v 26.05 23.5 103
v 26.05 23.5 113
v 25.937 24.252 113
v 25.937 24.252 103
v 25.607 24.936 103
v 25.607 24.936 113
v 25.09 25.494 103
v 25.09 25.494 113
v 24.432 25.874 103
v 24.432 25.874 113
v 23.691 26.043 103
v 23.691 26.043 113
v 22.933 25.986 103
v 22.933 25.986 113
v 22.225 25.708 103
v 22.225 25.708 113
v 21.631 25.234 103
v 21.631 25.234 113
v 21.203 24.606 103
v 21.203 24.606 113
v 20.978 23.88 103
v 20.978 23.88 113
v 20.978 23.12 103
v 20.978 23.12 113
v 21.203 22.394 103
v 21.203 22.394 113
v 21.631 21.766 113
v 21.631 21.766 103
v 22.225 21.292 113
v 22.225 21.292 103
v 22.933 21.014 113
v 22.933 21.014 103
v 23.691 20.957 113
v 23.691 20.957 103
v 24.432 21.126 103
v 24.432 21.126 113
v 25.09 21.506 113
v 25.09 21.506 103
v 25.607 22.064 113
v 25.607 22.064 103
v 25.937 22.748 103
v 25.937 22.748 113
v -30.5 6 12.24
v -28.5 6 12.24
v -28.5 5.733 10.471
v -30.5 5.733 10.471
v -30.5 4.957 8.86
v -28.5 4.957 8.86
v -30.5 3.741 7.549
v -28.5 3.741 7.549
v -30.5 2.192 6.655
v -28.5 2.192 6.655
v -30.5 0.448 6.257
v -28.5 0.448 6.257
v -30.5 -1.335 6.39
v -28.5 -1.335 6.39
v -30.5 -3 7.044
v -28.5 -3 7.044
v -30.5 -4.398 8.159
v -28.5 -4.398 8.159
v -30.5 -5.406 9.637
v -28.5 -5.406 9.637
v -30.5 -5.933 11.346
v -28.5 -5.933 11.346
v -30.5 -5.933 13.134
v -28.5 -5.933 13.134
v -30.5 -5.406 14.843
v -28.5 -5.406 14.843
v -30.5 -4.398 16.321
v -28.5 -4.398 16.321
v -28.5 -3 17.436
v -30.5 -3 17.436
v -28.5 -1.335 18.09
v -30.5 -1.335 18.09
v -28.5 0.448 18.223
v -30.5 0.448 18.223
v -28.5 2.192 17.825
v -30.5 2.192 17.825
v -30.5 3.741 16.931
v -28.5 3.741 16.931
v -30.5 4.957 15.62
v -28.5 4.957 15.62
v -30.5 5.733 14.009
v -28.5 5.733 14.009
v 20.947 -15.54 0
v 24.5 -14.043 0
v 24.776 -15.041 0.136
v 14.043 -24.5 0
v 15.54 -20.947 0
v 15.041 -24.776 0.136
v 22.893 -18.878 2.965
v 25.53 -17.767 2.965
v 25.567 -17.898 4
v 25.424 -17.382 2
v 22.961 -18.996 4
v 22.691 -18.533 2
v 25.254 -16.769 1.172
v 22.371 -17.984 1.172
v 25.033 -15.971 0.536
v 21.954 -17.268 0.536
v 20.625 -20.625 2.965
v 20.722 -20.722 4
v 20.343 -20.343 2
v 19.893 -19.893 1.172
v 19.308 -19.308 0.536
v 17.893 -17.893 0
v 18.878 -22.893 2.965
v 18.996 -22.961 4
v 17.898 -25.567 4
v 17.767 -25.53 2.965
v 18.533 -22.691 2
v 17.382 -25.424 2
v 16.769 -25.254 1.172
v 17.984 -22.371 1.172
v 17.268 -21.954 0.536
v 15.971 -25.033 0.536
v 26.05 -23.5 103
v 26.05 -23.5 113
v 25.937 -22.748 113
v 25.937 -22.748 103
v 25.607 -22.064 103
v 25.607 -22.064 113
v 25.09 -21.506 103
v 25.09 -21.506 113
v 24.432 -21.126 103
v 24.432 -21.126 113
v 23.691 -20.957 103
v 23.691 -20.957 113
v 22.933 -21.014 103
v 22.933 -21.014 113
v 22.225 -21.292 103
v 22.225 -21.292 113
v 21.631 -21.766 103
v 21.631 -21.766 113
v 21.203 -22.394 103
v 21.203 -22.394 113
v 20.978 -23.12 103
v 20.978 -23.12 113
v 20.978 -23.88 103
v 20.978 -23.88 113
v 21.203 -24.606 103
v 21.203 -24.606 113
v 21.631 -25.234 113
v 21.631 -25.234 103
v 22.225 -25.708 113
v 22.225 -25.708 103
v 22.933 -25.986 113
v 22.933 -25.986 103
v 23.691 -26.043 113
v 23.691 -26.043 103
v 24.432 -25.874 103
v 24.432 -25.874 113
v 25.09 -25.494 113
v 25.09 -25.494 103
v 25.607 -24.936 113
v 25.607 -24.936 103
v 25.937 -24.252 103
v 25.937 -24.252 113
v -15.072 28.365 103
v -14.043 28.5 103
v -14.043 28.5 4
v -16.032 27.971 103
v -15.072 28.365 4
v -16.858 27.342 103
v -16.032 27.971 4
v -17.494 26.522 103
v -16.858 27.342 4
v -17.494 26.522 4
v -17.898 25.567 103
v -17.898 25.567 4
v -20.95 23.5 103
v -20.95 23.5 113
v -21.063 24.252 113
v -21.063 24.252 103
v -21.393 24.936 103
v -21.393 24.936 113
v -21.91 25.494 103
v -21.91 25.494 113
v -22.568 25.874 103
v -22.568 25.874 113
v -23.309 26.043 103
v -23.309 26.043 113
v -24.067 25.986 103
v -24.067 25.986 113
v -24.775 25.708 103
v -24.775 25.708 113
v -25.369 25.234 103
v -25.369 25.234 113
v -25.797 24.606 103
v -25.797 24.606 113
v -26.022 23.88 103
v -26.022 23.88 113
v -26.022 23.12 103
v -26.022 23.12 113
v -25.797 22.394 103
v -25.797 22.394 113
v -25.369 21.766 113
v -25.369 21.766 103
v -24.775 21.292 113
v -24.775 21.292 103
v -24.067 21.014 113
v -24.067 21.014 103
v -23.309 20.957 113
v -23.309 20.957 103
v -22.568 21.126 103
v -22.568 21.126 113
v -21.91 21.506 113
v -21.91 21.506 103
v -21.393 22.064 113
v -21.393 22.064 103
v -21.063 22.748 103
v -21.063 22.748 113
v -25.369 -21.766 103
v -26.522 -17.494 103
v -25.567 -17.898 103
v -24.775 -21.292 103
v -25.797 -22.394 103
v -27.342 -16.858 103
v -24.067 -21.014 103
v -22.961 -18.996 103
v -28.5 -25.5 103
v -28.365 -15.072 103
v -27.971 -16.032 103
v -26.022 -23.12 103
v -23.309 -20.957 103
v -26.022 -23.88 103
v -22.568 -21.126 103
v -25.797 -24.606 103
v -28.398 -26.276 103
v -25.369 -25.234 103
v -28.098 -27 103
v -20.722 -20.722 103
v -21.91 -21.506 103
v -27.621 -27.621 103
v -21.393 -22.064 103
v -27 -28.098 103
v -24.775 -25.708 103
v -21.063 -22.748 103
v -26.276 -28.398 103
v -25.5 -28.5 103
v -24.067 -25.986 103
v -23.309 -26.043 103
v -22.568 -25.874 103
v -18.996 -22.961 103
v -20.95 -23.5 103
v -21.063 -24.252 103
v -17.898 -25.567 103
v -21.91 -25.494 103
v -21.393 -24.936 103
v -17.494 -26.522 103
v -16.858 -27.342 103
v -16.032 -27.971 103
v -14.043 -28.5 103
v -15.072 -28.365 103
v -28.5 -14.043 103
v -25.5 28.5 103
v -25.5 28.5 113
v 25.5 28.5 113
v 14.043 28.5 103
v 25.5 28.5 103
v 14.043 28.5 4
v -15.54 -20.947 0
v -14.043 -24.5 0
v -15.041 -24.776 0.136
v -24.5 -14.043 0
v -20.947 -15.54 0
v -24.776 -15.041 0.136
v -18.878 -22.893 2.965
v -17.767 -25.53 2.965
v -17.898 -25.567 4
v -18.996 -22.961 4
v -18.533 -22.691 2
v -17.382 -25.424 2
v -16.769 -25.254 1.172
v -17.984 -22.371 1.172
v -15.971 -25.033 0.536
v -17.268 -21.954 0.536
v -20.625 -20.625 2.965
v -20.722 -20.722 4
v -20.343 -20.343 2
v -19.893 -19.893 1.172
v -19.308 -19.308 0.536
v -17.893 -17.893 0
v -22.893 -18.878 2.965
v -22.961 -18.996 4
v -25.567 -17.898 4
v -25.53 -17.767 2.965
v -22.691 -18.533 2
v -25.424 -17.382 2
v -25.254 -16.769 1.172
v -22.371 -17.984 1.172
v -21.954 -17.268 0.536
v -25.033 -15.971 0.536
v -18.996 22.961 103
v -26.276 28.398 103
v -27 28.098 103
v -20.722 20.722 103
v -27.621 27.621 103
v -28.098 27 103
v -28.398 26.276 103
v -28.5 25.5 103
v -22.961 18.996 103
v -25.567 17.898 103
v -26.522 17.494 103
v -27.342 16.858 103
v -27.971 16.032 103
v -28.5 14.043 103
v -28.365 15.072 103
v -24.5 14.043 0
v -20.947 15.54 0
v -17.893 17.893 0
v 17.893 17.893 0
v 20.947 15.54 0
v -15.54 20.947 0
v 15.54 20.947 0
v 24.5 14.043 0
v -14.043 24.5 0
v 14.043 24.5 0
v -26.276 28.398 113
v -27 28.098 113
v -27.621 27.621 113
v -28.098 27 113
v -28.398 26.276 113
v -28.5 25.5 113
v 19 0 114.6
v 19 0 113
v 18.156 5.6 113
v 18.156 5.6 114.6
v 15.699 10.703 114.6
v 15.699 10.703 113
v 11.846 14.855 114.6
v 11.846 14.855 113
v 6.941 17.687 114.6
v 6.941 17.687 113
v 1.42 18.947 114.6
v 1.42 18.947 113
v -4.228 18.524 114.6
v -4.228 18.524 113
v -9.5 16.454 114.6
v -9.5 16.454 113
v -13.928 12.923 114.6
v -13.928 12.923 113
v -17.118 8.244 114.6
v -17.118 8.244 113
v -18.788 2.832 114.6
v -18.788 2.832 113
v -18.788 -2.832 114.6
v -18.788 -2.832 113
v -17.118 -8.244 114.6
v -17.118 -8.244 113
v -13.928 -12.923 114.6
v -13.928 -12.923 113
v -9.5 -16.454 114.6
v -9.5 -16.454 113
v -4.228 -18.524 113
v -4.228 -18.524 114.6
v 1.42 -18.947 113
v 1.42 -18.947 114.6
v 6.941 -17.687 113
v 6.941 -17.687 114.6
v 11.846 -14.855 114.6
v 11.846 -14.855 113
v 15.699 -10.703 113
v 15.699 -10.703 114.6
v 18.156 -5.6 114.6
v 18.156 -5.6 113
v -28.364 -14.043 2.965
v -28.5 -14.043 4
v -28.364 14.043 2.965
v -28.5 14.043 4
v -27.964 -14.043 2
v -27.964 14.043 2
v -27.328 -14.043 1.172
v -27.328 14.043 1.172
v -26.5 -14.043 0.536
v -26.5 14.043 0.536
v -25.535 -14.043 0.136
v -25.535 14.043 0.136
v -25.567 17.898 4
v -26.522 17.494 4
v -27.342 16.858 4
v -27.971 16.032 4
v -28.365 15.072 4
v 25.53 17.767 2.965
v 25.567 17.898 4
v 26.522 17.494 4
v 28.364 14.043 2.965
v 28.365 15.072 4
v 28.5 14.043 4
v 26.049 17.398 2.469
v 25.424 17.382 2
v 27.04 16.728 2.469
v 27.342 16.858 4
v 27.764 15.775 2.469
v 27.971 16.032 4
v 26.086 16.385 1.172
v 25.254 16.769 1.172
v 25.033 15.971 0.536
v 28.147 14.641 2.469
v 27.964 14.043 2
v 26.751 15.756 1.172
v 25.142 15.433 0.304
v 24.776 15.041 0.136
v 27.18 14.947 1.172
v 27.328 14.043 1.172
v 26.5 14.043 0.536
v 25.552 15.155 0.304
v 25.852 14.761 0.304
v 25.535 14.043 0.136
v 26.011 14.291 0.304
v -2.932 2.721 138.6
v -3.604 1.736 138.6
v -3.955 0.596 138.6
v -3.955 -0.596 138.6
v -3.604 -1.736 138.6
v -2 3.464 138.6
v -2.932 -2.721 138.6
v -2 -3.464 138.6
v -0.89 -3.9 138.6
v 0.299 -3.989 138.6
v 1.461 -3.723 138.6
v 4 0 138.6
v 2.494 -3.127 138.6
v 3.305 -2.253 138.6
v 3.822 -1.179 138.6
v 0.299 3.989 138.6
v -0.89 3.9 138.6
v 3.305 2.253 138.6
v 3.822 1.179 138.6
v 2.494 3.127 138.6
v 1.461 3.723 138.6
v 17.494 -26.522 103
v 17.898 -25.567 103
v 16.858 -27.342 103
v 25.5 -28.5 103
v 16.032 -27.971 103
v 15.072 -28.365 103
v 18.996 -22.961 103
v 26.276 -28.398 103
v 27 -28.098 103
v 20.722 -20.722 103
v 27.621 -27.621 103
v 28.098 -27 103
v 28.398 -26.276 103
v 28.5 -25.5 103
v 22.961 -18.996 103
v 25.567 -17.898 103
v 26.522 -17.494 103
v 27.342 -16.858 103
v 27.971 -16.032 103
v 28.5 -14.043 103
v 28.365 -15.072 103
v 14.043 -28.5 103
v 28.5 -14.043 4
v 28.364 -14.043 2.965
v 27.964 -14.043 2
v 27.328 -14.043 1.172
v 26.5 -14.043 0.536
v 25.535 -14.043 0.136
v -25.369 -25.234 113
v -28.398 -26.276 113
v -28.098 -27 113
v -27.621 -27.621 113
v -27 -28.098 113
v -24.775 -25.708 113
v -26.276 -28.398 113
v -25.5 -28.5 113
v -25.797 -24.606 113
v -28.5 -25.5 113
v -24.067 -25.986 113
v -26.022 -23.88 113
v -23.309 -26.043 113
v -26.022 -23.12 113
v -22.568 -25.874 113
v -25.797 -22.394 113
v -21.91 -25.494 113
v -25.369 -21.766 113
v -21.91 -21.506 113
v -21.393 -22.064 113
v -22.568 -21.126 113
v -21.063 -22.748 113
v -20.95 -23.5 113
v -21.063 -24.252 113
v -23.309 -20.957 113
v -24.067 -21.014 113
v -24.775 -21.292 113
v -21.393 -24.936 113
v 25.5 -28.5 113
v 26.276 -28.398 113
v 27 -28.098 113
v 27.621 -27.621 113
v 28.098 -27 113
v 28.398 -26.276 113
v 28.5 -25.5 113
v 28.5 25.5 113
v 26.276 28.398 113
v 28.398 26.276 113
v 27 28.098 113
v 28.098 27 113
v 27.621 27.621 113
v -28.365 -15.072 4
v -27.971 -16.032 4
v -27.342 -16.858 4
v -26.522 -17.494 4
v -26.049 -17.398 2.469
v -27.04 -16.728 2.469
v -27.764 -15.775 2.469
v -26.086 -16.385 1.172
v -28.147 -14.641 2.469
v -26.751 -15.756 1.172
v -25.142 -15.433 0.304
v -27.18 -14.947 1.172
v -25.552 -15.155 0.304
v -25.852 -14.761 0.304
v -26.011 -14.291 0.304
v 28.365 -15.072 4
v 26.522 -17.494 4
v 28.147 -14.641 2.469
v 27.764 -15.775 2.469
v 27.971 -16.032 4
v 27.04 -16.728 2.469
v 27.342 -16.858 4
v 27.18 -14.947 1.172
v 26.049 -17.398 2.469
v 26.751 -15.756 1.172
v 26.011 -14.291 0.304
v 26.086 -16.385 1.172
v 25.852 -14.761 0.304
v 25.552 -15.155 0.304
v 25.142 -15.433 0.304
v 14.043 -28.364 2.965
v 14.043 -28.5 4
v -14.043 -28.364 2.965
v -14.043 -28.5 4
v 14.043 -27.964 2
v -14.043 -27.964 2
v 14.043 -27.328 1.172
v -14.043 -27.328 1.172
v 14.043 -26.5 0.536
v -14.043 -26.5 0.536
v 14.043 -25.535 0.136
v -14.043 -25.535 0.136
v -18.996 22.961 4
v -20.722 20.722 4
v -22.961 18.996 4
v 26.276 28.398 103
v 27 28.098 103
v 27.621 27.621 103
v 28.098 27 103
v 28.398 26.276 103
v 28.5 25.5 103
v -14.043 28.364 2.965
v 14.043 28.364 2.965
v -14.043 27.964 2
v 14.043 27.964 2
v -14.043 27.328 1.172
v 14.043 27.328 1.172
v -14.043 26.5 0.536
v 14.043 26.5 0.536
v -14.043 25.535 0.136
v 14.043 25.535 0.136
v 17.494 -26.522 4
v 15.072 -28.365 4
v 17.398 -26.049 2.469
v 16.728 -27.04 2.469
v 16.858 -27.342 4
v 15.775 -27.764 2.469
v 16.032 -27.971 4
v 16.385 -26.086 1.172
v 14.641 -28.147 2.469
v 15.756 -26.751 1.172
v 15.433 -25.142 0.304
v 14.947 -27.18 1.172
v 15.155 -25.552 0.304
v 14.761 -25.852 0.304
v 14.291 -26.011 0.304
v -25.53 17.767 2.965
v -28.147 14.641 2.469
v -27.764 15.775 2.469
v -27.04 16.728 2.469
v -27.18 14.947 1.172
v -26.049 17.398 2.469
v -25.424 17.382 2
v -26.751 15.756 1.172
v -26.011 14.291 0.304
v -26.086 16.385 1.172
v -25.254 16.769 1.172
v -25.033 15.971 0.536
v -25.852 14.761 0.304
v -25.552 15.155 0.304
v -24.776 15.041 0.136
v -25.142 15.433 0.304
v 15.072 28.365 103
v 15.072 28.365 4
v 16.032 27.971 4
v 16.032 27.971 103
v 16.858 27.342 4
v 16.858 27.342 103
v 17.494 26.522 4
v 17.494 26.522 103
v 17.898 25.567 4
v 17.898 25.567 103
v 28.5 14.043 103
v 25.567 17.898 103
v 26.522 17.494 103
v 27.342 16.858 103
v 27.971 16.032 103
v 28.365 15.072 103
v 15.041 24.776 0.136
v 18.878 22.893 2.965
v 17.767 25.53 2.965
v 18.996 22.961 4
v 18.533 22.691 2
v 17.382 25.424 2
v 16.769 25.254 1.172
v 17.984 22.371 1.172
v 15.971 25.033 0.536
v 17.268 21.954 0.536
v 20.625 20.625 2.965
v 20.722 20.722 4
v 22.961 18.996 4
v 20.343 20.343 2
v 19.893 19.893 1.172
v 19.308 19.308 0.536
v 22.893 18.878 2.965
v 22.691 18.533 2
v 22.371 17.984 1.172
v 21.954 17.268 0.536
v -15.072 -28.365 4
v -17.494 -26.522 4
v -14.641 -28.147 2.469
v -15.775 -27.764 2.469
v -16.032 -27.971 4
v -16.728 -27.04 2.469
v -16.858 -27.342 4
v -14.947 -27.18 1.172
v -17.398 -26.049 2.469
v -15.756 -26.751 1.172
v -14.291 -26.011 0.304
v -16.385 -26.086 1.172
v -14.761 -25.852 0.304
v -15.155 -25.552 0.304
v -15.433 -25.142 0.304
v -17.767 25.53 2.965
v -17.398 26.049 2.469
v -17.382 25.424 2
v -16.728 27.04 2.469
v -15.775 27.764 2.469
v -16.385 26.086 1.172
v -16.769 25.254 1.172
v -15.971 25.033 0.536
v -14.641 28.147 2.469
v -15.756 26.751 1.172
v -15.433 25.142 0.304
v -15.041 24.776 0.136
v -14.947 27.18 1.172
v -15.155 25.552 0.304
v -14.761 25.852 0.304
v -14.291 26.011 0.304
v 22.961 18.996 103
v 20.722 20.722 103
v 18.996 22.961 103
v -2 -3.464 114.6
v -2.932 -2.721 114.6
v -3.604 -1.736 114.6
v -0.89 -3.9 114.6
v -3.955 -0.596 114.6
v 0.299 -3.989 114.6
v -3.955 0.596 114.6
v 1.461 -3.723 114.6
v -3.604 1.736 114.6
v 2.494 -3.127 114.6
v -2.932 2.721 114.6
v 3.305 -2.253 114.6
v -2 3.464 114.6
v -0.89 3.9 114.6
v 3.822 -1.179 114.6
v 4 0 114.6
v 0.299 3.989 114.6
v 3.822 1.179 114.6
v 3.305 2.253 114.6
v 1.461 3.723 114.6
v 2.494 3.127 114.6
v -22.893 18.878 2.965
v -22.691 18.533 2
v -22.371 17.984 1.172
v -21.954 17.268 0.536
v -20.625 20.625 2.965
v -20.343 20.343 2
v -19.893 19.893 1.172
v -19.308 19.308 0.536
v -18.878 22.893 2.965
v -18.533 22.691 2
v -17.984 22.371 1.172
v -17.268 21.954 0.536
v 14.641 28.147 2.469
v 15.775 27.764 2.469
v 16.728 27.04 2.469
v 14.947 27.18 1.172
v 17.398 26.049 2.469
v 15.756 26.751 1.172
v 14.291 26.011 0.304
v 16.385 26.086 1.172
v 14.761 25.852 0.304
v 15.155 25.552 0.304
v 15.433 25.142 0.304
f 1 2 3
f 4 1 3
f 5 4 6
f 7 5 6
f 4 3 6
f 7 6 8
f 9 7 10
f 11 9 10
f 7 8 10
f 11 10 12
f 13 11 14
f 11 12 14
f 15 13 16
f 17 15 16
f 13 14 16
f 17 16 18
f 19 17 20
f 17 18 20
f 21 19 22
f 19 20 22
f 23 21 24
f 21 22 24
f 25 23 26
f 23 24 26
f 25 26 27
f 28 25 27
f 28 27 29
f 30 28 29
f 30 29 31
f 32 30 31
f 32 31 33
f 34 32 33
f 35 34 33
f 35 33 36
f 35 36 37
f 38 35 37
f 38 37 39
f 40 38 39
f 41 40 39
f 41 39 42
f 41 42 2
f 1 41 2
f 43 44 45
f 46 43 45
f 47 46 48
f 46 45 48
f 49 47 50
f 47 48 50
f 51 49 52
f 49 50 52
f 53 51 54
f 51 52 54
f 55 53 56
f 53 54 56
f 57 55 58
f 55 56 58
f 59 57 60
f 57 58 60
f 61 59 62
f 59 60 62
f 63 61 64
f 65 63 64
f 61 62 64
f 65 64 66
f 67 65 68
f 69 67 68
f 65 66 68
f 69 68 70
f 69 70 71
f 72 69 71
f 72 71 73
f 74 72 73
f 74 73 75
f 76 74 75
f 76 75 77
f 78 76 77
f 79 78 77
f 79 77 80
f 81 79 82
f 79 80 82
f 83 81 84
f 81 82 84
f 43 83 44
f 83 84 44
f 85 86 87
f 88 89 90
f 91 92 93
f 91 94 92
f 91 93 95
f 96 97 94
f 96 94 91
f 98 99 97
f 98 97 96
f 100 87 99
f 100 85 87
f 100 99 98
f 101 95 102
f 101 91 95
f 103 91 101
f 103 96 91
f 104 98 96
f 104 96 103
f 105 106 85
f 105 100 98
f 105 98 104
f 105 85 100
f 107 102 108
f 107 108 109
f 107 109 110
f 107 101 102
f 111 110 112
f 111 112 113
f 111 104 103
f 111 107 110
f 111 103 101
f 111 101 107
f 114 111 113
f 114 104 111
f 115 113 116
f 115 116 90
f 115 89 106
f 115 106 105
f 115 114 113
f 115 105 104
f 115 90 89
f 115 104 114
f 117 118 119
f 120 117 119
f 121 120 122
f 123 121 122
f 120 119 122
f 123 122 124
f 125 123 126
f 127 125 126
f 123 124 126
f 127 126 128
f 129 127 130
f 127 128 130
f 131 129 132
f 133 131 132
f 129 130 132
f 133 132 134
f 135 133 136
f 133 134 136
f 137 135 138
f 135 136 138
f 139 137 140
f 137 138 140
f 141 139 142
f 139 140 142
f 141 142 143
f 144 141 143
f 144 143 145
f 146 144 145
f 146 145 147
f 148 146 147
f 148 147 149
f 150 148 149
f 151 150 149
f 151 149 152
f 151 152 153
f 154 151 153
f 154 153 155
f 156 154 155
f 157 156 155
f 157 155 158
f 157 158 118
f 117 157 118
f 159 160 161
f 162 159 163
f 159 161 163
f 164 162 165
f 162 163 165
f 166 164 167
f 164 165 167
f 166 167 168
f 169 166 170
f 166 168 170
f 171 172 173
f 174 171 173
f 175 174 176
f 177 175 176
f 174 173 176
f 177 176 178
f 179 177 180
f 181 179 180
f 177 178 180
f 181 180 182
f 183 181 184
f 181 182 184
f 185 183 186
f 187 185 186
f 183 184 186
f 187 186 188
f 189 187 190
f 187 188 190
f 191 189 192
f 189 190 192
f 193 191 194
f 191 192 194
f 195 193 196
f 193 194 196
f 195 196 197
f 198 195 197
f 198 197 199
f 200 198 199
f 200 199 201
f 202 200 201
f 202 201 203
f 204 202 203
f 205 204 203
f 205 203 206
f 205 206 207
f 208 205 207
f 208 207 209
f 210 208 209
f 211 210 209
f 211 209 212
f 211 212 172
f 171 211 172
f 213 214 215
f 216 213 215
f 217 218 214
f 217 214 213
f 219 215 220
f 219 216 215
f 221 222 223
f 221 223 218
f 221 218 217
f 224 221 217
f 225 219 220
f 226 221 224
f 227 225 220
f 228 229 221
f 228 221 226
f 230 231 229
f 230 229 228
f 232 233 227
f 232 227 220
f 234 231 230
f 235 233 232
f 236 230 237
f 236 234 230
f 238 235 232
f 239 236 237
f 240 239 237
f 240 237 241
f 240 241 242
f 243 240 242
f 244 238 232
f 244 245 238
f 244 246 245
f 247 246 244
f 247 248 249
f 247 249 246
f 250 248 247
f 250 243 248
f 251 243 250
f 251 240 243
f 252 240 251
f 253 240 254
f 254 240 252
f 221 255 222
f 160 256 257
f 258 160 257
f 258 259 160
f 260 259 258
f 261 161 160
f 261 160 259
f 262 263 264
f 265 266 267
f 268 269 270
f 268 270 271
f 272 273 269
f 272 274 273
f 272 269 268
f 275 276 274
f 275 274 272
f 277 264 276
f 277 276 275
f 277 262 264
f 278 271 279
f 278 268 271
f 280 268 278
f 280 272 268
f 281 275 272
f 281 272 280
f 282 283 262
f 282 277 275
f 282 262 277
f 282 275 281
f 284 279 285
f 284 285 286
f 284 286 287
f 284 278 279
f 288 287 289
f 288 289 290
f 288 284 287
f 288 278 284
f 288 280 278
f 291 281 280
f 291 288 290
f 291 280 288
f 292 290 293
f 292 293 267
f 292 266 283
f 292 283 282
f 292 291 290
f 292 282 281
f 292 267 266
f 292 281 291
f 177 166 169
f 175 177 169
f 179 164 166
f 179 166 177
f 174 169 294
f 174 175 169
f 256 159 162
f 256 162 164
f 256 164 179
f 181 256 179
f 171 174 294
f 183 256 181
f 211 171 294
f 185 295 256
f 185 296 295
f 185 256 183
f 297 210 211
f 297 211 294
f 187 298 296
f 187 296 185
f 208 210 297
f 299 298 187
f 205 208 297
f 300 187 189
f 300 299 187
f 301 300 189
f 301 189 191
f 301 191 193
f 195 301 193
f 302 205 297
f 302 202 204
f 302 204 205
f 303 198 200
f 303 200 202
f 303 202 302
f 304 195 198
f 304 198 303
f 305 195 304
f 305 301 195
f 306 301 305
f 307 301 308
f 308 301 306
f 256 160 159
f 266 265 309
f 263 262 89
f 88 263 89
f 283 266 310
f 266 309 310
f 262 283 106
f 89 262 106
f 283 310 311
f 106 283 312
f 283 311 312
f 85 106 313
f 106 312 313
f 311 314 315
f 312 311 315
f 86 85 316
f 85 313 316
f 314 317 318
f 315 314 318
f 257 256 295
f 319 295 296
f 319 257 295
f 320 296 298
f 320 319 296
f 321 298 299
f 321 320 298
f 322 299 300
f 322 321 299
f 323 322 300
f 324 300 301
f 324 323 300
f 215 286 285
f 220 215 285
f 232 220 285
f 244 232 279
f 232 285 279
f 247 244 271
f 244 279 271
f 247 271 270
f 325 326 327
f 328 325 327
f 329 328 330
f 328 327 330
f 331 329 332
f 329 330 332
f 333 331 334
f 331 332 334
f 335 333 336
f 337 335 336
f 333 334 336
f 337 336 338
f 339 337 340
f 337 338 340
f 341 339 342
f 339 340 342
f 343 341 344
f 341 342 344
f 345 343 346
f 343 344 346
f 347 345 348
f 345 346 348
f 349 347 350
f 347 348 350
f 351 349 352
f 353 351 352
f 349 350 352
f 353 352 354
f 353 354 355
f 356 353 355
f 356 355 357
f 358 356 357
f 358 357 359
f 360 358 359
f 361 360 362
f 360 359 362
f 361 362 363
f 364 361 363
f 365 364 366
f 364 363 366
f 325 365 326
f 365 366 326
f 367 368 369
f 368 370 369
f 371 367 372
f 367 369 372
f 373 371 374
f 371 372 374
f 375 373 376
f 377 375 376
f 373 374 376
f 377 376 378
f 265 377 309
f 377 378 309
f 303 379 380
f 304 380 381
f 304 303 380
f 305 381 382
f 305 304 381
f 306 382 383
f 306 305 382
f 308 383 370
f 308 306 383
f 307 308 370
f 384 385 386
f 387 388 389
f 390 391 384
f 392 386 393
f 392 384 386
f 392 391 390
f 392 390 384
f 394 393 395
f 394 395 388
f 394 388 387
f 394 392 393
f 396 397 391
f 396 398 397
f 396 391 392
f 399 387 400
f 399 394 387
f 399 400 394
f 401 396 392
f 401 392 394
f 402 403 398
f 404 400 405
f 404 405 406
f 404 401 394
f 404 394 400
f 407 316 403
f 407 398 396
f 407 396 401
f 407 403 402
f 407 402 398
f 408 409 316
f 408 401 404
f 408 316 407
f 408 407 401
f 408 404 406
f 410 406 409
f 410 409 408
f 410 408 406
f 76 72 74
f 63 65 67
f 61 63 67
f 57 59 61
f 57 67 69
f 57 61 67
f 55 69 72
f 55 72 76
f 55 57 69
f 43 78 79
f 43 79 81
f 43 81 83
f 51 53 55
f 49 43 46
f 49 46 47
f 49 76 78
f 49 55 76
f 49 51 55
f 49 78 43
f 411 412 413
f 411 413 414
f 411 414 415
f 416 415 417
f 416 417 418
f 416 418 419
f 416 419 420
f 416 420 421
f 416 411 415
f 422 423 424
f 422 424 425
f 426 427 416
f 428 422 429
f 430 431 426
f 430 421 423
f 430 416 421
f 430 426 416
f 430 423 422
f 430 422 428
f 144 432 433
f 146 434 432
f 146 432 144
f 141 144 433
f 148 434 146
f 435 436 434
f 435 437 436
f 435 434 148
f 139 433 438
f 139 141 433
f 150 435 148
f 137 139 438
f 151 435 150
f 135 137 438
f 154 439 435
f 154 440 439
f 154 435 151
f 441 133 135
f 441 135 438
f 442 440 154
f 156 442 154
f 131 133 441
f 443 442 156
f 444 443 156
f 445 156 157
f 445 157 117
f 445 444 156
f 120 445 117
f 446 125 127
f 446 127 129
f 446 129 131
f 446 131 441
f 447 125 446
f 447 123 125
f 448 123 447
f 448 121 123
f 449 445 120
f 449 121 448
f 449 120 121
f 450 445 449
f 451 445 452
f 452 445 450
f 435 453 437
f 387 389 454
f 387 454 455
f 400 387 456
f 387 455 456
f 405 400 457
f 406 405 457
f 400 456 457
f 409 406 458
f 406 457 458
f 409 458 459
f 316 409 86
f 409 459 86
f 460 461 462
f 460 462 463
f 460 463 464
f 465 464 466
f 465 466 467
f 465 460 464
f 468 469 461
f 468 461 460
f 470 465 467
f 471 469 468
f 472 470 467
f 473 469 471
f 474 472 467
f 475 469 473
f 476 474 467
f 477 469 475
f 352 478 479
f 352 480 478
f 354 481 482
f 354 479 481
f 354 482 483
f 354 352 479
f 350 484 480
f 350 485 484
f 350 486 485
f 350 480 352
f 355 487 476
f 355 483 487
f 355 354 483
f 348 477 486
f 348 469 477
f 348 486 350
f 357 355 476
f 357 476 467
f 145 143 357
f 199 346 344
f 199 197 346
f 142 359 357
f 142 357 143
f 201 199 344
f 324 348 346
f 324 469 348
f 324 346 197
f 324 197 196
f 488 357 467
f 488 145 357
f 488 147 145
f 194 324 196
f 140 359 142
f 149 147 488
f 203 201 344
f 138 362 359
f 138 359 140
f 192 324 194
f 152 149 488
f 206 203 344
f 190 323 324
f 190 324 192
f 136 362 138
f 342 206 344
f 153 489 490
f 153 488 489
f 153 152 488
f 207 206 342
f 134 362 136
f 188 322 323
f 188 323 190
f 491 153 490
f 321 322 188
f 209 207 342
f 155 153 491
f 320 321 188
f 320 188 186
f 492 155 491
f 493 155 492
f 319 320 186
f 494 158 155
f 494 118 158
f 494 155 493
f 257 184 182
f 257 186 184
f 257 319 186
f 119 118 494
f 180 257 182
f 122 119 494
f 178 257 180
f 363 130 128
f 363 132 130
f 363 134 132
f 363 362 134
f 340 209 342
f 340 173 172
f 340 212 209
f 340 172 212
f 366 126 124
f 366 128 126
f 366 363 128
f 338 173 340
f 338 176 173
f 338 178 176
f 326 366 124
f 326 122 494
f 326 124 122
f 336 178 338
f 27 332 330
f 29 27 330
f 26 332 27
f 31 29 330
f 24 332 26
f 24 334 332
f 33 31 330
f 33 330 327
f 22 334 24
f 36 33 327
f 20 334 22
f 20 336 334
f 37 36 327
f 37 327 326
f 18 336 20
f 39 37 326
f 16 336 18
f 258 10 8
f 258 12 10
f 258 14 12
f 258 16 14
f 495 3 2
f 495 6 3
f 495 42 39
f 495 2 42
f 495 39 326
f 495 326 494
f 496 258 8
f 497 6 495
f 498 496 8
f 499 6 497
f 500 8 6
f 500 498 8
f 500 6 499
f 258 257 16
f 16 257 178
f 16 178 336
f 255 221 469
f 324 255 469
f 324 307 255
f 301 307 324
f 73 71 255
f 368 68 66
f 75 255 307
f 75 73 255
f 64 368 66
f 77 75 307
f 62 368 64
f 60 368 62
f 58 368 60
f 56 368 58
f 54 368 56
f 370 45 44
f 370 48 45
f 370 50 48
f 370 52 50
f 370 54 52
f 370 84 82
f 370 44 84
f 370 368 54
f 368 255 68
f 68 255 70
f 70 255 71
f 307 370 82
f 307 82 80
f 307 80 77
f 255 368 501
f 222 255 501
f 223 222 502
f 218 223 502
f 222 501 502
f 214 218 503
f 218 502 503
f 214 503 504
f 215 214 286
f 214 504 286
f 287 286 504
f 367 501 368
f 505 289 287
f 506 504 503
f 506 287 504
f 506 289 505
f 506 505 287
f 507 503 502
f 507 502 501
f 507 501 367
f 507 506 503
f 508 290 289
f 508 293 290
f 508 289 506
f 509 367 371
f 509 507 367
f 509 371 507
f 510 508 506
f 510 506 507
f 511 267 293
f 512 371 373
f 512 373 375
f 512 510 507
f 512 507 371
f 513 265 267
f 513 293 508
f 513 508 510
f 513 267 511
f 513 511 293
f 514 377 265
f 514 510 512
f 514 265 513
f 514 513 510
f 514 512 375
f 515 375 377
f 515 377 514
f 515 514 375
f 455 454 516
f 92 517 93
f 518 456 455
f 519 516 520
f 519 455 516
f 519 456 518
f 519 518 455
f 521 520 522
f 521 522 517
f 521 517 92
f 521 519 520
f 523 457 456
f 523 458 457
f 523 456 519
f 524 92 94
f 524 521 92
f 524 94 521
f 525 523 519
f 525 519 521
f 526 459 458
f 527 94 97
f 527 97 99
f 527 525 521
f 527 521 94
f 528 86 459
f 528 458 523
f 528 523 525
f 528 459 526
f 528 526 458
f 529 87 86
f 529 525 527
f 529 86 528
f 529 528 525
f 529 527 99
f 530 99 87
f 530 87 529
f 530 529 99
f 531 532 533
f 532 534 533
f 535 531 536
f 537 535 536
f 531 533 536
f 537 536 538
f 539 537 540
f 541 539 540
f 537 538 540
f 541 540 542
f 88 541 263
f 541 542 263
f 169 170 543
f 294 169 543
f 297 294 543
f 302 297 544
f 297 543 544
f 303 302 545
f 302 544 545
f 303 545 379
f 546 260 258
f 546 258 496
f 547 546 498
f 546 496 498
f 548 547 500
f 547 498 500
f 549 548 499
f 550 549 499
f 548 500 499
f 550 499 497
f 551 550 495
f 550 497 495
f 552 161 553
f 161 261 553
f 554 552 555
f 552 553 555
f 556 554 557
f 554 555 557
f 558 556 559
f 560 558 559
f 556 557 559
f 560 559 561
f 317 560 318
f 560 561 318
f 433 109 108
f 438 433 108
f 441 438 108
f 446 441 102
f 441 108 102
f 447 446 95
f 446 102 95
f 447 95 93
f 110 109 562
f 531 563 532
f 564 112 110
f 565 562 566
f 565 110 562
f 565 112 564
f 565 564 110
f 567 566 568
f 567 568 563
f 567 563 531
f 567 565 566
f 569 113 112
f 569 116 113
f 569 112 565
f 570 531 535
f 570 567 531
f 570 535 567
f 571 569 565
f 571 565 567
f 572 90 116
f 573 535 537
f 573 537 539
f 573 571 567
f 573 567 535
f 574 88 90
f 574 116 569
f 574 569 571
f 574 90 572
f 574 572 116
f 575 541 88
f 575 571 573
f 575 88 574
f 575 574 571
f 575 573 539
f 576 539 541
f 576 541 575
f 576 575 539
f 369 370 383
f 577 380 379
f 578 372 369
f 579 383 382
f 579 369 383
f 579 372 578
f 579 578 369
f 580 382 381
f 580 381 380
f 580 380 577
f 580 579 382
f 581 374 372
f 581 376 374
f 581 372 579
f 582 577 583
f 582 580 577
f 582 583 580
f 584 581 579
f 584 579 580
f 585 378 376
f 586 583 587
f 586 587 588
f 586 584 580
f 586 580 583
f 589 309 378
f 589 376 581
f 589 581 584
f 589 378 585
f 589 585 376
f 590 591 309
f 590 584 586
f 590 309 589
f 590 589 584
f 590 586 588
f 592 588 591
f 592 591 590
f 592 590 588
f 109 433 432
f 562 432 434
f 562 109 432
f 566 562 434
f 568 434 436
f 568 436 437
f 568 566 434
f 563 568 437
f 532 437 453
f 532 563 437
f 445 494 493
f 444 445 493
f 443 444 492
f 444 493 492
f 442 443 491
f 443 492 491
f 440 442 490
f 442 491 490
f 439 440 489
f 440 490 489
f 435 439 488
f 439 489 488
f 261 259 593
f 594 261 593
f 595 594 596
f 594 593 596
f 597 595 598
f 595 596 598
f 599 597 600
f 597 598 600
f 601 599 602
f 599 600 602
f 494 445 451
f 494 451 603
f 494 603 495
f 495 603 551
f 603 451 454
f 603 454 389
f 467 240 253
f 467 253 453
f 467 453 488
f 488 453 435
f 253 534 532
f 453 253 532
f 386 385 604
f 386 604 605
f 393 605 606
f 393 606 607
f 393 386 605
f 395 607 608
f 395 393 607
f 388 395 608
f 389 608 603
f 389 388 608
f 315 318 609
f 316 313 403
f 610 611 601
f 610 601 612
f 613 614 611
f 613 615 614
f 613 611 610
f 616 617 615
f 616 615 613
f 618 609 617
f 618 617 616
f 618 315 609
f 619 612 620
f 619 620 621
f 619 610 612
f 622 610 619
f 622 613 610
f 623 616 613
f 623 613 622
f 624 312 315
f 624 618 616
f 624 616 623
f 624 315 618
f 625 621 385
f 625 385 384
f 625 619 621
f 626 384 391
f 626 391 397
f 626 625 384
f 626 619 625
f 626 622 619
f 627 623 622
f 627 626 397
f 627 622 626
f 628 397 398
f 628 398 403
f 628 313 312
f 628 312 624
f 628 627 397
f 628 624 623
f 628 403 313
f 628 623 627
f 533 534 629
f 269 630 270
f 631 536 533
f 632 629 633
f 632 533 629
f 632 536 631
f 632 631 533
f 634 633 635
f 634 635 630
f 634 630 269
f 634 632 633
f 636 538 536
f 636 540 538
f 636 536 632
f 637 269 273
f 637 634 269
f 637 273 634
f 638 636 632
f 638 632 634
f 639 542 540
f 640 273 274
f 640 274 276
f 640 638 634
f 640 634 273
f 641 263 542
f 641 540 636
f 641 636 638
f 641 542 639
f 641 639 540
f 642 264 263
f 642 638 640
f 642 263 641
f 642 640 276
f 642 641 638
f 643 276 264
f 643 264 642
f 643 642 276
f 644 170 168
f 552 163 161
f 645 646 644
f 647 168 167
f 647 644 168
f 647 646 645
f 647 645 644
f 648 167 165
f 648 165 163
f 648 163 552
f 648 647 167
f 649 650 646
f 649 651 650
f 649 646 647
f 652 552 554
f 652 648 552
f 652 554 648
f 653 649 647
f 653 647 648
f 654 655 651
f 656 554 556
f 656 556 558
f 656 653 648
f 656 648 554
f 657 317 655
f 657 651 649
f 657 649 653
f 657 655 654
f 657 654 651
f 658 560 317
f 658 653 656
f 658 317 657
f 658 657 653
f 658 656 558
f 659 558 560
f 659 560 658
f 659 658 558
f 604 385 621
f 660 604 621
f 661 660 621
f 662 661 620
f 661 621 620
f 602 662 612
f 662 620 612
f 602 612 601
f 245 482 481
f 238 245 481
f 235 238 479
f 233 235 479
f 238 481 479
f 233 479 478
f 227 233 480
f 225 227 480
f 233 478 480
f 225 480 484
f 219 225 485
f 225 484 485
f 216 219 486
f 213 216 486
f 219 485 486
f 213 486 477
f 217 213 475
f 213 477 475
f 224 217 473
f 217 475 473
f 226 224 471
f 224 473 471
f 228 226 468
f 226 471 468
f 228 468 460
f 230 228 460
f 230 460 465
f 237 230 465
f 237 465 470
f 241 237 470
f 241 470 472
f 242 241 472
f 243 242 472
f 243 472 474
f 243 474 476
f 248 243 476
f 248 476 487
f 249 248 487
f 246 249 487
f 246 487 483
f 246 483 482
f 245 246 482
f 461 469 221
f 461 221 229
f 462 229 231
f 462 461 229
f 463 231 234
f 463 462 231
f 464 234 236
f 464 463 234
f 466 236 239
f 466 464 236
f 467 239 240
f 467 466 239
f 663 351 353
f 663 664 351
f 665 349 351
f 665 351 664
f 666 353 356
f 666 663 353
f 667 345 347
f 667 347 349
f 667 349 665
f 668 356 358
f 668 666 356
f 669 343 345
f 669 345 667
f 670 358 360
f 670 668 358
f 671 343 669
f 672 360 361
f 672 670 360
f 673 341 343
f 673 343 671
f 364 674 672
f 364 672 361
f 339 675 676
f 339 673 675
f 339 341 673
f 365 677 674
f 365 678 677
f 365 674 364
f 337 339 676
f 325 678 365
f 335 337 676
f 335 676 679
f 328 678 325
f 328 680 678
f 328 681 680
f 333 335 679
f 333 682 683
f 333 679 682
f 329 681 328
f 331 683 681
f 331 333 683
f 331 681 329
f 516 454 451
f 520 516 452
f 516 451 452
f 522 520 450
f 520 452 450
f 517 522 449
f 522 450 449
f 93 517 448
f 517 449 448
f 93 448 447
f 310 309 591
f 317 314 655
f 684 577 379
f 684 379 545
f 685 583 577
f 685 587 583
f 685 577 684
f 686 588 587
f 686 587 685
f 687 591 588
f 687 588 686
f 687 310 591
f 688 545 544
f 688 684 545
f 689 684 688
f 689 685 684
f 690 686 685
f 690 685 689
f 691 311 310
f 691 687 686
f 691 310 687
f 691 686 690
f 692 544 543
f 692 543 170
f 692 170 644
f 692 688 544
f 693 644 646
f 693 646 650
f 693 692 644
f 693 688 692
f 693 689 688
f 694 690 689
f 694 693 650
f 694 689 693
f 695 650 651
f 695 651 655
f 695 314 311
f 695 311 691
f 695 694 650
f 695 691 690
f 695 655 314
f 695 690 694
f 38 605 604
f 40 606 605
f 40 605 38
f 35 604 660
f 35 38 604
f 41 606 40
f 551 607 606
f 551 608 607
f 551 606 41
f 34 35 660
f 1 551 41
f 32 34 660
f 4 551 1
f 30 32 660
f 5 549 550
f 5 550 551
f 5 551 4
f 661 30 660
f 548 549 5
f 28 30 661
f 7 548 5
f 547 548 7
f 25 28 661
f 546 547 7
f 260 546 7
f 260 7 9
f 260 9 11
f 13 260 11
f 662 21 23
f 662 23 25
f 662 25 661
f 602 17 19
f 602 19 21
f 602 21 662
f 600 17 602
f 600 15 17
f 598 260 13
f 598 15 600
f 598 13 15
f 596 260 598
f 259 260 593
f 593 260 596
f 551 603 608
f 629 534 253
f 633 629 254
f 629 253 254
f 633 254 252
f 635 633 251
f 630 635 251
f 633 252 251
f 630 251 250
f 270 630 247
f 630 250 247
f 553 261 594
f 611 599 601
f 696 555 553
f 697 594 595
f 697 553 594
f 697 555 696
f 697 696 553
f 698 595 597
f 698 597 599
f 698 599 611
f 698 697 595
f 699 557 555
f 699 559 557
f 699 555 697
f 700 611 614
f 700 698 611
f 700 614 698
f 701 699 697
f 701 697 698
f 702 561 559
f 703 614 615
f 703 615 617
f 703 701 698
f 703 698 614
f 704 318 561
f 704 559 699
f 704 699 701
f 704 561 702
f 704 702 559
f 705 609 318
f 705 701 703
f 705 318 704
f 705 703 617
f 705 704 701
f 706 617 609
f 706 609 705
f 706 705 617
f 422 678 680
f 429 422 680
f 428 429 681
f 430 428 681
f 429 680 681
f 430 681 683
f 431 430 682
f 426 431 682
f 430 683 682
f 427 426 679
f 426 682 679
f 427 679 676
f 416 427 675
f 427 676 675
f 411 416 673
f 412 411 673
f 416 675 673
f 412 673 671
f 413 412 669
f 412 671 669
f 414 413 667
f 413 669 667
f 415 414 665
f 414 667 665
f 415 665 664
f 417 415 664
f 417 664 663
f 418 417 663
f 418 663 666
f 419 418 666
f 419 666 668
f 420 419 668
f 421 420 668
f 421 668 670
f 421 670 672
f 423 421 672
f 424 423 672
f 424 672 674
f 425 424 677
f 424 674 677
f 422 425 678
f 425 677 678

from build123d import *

# Parameters (mm, degrees)
SKETCH1_W           = 57
SKETCH1_H           = 57
BOSS_EXTRUDE1_DEPTH = 113
SKETCH2_R           = 11
CUT_EXTRUDE1_DEPTH  = 103
SKETCH3_R           = 2.55
CUT_EXTRUDE2_DEPTH  = 120.97291361
FILLET2_R           = 3
SKETCH4_R           = 19
BOSS_EXTRUDE2_DEPTH = 1.6
FILLET4_R           = 3
SKETCH6_R           = 4
BOSS_EXTRUDE3_DEPTH = 24
SKETCH7_R           = 6
BOSS_EXTRUDE4_DEPTH = 2
CIRPATTERN4_COUNT   = 4
FILLET5_R           = 4
FILLET6_R           = 4


with BuildPart() as part:
    # Sketch1 → Boss-Extrude1 (new body)
    with BuildSketch(Plane.XY):
        Rectangle(SKETCH1_W, SKETCH1_H)
    extrude(amount=BOSS_EXTRUDE1_DEPTH)

    # Sketch2 → Cut-Extrude1 (cut)
    with BuildSketch(Plane(origin=(0, 0, 0), x_dir=(-1, 0, 0), z_dir=(0, 0, -1))):
        with Locations((-28.5, 28.5)):
            Circle(SKETCH2_R)
    cut_extrude1 = extrude(amount=-CUT_EXTRUDE1_DEPTH, mode=Mode.SUBTRACT)

    # Sketch3 → Cut-Extrude2 (cut, through all)
    with BuildSketch(Plane.XY.offset(113)):
        with Locations((-23.5, 23.5)):
            Circle(SKETCH3_R)
        with Locations((23.5, 23.5)):
            Circle(SKETCH3_R)
        with Locations((23.5, -23.5)):
            Circle(SKETCH3_R)
        with Locations((-23.5, -23.5)):
            Circle(SKETCH3_R)
    extrude(amount=-CUT_EXTRUDE2_DEPTH, mode=Mode.SUBTRACT)

    # Fillet2
    fillet2_edges = [part.edges().sort_by_distance(p)[0] for p in [
        (28.5, 28.5, 108),
    ]]
    fillet(fillet2_edges, radius=FILLET2_R)

    # Sketch4 → Boss-Extrude2 (add)
    with BuildSketch(Plane.XY.offset(113)):
        Circle(SKETCH4_R)
    extrude(amount=BOSS_EXTRUDE2_DEPTH)

    # Fillet4
    fillet4_edges = [part.edges().sort_by_distance(p)[0] for p in [
        (-28.5, 28.5, 56.5),
        (28.5, -28.5, 56.5),
        (-28.5, -28.5, 56.5),
    ]]
    fillet(fillet4_edges, radius=FILLET4_R)

    # Sketch6 → Boss-Extrude3 (add)
    with BuildSketch(Plane.XY.offset(114.6)):
        Circle(SKETCH6_R)
    extrude(amount=BOSS_EXTRUDE3_DEPTH)

    # Sketch7 → Boss-Extrude4 (add)
    with BuildSketch(Plane.ZY.offset(28.5)):
        with Locations(Location((12.240016964, 0, 0), (0, 0, 90))):
            Circle(SKETCH7_R)
    extrude(amount=BOSS_EXTRUDE4_DEPTH)

    # CirPattern4: Cut-Extrude1 ×4 about axis
    cirpattern4_axis = Axis((0, 0, 0), (0, 0, 1))
    for i in range(1, CIRPATTERN4_COUNT):
        add(cut_extrude1.rotate(cirpattern4_axis, i * 360 / CIRPATTERN4_COUNT), mode=Mode.SUBTRACT)

    # Fillet5
    fillet5_edges = [part.edges().sort_by_distance(p)[0] for p in [
        (-28.5, -17.5, 51.5),
        (-17.5, -28.5, 51.5),
        (17.5, -28.5, 51.5),
        (28.5, -17.5, 51.5),
        (28.5, 17.5, 51.5),
        (17.5, 28.5, 51.5),
        (-28.5, 17.5, 51.5),
        (-17.5, 28.5, 51.5),
    ]]
    fillet(fillet5_edges, radius=FILLET5_R)

    # Fillet6
    fillet6_edges = [part.edges().sort_by_distance(p)[0] for p in [
        (-28.5, 0, 0),
        (-20.721825407, 20.721825407, 0),
        (0, 28.5, 0),
        (20.721825407, 20.721825407, 0),
        (28.5, 0, 0),
        (20.721825407, -20.721825407, 0),
        (0, -28.5, 0),
        (-20.721825407, -20.721825407, 0),
        (27.683289703, -16.465287988, 0),
        (16.465287988, -27.683289703, 0),
        (-16.465287988, -27.683289703, 0),
        (-27.683289703, -16.465287988, 0),
        (27.683289703, 16.465287988, 0),
        (16.465287988, 27.683289703, 0),
        (-16.465287988, 27.683289703, 0),
        (-27.683289703, 16.465287988, 0),
    ]]
    fillet(fillet6_edges, radius=FILLET6_R)


solid = part.part
